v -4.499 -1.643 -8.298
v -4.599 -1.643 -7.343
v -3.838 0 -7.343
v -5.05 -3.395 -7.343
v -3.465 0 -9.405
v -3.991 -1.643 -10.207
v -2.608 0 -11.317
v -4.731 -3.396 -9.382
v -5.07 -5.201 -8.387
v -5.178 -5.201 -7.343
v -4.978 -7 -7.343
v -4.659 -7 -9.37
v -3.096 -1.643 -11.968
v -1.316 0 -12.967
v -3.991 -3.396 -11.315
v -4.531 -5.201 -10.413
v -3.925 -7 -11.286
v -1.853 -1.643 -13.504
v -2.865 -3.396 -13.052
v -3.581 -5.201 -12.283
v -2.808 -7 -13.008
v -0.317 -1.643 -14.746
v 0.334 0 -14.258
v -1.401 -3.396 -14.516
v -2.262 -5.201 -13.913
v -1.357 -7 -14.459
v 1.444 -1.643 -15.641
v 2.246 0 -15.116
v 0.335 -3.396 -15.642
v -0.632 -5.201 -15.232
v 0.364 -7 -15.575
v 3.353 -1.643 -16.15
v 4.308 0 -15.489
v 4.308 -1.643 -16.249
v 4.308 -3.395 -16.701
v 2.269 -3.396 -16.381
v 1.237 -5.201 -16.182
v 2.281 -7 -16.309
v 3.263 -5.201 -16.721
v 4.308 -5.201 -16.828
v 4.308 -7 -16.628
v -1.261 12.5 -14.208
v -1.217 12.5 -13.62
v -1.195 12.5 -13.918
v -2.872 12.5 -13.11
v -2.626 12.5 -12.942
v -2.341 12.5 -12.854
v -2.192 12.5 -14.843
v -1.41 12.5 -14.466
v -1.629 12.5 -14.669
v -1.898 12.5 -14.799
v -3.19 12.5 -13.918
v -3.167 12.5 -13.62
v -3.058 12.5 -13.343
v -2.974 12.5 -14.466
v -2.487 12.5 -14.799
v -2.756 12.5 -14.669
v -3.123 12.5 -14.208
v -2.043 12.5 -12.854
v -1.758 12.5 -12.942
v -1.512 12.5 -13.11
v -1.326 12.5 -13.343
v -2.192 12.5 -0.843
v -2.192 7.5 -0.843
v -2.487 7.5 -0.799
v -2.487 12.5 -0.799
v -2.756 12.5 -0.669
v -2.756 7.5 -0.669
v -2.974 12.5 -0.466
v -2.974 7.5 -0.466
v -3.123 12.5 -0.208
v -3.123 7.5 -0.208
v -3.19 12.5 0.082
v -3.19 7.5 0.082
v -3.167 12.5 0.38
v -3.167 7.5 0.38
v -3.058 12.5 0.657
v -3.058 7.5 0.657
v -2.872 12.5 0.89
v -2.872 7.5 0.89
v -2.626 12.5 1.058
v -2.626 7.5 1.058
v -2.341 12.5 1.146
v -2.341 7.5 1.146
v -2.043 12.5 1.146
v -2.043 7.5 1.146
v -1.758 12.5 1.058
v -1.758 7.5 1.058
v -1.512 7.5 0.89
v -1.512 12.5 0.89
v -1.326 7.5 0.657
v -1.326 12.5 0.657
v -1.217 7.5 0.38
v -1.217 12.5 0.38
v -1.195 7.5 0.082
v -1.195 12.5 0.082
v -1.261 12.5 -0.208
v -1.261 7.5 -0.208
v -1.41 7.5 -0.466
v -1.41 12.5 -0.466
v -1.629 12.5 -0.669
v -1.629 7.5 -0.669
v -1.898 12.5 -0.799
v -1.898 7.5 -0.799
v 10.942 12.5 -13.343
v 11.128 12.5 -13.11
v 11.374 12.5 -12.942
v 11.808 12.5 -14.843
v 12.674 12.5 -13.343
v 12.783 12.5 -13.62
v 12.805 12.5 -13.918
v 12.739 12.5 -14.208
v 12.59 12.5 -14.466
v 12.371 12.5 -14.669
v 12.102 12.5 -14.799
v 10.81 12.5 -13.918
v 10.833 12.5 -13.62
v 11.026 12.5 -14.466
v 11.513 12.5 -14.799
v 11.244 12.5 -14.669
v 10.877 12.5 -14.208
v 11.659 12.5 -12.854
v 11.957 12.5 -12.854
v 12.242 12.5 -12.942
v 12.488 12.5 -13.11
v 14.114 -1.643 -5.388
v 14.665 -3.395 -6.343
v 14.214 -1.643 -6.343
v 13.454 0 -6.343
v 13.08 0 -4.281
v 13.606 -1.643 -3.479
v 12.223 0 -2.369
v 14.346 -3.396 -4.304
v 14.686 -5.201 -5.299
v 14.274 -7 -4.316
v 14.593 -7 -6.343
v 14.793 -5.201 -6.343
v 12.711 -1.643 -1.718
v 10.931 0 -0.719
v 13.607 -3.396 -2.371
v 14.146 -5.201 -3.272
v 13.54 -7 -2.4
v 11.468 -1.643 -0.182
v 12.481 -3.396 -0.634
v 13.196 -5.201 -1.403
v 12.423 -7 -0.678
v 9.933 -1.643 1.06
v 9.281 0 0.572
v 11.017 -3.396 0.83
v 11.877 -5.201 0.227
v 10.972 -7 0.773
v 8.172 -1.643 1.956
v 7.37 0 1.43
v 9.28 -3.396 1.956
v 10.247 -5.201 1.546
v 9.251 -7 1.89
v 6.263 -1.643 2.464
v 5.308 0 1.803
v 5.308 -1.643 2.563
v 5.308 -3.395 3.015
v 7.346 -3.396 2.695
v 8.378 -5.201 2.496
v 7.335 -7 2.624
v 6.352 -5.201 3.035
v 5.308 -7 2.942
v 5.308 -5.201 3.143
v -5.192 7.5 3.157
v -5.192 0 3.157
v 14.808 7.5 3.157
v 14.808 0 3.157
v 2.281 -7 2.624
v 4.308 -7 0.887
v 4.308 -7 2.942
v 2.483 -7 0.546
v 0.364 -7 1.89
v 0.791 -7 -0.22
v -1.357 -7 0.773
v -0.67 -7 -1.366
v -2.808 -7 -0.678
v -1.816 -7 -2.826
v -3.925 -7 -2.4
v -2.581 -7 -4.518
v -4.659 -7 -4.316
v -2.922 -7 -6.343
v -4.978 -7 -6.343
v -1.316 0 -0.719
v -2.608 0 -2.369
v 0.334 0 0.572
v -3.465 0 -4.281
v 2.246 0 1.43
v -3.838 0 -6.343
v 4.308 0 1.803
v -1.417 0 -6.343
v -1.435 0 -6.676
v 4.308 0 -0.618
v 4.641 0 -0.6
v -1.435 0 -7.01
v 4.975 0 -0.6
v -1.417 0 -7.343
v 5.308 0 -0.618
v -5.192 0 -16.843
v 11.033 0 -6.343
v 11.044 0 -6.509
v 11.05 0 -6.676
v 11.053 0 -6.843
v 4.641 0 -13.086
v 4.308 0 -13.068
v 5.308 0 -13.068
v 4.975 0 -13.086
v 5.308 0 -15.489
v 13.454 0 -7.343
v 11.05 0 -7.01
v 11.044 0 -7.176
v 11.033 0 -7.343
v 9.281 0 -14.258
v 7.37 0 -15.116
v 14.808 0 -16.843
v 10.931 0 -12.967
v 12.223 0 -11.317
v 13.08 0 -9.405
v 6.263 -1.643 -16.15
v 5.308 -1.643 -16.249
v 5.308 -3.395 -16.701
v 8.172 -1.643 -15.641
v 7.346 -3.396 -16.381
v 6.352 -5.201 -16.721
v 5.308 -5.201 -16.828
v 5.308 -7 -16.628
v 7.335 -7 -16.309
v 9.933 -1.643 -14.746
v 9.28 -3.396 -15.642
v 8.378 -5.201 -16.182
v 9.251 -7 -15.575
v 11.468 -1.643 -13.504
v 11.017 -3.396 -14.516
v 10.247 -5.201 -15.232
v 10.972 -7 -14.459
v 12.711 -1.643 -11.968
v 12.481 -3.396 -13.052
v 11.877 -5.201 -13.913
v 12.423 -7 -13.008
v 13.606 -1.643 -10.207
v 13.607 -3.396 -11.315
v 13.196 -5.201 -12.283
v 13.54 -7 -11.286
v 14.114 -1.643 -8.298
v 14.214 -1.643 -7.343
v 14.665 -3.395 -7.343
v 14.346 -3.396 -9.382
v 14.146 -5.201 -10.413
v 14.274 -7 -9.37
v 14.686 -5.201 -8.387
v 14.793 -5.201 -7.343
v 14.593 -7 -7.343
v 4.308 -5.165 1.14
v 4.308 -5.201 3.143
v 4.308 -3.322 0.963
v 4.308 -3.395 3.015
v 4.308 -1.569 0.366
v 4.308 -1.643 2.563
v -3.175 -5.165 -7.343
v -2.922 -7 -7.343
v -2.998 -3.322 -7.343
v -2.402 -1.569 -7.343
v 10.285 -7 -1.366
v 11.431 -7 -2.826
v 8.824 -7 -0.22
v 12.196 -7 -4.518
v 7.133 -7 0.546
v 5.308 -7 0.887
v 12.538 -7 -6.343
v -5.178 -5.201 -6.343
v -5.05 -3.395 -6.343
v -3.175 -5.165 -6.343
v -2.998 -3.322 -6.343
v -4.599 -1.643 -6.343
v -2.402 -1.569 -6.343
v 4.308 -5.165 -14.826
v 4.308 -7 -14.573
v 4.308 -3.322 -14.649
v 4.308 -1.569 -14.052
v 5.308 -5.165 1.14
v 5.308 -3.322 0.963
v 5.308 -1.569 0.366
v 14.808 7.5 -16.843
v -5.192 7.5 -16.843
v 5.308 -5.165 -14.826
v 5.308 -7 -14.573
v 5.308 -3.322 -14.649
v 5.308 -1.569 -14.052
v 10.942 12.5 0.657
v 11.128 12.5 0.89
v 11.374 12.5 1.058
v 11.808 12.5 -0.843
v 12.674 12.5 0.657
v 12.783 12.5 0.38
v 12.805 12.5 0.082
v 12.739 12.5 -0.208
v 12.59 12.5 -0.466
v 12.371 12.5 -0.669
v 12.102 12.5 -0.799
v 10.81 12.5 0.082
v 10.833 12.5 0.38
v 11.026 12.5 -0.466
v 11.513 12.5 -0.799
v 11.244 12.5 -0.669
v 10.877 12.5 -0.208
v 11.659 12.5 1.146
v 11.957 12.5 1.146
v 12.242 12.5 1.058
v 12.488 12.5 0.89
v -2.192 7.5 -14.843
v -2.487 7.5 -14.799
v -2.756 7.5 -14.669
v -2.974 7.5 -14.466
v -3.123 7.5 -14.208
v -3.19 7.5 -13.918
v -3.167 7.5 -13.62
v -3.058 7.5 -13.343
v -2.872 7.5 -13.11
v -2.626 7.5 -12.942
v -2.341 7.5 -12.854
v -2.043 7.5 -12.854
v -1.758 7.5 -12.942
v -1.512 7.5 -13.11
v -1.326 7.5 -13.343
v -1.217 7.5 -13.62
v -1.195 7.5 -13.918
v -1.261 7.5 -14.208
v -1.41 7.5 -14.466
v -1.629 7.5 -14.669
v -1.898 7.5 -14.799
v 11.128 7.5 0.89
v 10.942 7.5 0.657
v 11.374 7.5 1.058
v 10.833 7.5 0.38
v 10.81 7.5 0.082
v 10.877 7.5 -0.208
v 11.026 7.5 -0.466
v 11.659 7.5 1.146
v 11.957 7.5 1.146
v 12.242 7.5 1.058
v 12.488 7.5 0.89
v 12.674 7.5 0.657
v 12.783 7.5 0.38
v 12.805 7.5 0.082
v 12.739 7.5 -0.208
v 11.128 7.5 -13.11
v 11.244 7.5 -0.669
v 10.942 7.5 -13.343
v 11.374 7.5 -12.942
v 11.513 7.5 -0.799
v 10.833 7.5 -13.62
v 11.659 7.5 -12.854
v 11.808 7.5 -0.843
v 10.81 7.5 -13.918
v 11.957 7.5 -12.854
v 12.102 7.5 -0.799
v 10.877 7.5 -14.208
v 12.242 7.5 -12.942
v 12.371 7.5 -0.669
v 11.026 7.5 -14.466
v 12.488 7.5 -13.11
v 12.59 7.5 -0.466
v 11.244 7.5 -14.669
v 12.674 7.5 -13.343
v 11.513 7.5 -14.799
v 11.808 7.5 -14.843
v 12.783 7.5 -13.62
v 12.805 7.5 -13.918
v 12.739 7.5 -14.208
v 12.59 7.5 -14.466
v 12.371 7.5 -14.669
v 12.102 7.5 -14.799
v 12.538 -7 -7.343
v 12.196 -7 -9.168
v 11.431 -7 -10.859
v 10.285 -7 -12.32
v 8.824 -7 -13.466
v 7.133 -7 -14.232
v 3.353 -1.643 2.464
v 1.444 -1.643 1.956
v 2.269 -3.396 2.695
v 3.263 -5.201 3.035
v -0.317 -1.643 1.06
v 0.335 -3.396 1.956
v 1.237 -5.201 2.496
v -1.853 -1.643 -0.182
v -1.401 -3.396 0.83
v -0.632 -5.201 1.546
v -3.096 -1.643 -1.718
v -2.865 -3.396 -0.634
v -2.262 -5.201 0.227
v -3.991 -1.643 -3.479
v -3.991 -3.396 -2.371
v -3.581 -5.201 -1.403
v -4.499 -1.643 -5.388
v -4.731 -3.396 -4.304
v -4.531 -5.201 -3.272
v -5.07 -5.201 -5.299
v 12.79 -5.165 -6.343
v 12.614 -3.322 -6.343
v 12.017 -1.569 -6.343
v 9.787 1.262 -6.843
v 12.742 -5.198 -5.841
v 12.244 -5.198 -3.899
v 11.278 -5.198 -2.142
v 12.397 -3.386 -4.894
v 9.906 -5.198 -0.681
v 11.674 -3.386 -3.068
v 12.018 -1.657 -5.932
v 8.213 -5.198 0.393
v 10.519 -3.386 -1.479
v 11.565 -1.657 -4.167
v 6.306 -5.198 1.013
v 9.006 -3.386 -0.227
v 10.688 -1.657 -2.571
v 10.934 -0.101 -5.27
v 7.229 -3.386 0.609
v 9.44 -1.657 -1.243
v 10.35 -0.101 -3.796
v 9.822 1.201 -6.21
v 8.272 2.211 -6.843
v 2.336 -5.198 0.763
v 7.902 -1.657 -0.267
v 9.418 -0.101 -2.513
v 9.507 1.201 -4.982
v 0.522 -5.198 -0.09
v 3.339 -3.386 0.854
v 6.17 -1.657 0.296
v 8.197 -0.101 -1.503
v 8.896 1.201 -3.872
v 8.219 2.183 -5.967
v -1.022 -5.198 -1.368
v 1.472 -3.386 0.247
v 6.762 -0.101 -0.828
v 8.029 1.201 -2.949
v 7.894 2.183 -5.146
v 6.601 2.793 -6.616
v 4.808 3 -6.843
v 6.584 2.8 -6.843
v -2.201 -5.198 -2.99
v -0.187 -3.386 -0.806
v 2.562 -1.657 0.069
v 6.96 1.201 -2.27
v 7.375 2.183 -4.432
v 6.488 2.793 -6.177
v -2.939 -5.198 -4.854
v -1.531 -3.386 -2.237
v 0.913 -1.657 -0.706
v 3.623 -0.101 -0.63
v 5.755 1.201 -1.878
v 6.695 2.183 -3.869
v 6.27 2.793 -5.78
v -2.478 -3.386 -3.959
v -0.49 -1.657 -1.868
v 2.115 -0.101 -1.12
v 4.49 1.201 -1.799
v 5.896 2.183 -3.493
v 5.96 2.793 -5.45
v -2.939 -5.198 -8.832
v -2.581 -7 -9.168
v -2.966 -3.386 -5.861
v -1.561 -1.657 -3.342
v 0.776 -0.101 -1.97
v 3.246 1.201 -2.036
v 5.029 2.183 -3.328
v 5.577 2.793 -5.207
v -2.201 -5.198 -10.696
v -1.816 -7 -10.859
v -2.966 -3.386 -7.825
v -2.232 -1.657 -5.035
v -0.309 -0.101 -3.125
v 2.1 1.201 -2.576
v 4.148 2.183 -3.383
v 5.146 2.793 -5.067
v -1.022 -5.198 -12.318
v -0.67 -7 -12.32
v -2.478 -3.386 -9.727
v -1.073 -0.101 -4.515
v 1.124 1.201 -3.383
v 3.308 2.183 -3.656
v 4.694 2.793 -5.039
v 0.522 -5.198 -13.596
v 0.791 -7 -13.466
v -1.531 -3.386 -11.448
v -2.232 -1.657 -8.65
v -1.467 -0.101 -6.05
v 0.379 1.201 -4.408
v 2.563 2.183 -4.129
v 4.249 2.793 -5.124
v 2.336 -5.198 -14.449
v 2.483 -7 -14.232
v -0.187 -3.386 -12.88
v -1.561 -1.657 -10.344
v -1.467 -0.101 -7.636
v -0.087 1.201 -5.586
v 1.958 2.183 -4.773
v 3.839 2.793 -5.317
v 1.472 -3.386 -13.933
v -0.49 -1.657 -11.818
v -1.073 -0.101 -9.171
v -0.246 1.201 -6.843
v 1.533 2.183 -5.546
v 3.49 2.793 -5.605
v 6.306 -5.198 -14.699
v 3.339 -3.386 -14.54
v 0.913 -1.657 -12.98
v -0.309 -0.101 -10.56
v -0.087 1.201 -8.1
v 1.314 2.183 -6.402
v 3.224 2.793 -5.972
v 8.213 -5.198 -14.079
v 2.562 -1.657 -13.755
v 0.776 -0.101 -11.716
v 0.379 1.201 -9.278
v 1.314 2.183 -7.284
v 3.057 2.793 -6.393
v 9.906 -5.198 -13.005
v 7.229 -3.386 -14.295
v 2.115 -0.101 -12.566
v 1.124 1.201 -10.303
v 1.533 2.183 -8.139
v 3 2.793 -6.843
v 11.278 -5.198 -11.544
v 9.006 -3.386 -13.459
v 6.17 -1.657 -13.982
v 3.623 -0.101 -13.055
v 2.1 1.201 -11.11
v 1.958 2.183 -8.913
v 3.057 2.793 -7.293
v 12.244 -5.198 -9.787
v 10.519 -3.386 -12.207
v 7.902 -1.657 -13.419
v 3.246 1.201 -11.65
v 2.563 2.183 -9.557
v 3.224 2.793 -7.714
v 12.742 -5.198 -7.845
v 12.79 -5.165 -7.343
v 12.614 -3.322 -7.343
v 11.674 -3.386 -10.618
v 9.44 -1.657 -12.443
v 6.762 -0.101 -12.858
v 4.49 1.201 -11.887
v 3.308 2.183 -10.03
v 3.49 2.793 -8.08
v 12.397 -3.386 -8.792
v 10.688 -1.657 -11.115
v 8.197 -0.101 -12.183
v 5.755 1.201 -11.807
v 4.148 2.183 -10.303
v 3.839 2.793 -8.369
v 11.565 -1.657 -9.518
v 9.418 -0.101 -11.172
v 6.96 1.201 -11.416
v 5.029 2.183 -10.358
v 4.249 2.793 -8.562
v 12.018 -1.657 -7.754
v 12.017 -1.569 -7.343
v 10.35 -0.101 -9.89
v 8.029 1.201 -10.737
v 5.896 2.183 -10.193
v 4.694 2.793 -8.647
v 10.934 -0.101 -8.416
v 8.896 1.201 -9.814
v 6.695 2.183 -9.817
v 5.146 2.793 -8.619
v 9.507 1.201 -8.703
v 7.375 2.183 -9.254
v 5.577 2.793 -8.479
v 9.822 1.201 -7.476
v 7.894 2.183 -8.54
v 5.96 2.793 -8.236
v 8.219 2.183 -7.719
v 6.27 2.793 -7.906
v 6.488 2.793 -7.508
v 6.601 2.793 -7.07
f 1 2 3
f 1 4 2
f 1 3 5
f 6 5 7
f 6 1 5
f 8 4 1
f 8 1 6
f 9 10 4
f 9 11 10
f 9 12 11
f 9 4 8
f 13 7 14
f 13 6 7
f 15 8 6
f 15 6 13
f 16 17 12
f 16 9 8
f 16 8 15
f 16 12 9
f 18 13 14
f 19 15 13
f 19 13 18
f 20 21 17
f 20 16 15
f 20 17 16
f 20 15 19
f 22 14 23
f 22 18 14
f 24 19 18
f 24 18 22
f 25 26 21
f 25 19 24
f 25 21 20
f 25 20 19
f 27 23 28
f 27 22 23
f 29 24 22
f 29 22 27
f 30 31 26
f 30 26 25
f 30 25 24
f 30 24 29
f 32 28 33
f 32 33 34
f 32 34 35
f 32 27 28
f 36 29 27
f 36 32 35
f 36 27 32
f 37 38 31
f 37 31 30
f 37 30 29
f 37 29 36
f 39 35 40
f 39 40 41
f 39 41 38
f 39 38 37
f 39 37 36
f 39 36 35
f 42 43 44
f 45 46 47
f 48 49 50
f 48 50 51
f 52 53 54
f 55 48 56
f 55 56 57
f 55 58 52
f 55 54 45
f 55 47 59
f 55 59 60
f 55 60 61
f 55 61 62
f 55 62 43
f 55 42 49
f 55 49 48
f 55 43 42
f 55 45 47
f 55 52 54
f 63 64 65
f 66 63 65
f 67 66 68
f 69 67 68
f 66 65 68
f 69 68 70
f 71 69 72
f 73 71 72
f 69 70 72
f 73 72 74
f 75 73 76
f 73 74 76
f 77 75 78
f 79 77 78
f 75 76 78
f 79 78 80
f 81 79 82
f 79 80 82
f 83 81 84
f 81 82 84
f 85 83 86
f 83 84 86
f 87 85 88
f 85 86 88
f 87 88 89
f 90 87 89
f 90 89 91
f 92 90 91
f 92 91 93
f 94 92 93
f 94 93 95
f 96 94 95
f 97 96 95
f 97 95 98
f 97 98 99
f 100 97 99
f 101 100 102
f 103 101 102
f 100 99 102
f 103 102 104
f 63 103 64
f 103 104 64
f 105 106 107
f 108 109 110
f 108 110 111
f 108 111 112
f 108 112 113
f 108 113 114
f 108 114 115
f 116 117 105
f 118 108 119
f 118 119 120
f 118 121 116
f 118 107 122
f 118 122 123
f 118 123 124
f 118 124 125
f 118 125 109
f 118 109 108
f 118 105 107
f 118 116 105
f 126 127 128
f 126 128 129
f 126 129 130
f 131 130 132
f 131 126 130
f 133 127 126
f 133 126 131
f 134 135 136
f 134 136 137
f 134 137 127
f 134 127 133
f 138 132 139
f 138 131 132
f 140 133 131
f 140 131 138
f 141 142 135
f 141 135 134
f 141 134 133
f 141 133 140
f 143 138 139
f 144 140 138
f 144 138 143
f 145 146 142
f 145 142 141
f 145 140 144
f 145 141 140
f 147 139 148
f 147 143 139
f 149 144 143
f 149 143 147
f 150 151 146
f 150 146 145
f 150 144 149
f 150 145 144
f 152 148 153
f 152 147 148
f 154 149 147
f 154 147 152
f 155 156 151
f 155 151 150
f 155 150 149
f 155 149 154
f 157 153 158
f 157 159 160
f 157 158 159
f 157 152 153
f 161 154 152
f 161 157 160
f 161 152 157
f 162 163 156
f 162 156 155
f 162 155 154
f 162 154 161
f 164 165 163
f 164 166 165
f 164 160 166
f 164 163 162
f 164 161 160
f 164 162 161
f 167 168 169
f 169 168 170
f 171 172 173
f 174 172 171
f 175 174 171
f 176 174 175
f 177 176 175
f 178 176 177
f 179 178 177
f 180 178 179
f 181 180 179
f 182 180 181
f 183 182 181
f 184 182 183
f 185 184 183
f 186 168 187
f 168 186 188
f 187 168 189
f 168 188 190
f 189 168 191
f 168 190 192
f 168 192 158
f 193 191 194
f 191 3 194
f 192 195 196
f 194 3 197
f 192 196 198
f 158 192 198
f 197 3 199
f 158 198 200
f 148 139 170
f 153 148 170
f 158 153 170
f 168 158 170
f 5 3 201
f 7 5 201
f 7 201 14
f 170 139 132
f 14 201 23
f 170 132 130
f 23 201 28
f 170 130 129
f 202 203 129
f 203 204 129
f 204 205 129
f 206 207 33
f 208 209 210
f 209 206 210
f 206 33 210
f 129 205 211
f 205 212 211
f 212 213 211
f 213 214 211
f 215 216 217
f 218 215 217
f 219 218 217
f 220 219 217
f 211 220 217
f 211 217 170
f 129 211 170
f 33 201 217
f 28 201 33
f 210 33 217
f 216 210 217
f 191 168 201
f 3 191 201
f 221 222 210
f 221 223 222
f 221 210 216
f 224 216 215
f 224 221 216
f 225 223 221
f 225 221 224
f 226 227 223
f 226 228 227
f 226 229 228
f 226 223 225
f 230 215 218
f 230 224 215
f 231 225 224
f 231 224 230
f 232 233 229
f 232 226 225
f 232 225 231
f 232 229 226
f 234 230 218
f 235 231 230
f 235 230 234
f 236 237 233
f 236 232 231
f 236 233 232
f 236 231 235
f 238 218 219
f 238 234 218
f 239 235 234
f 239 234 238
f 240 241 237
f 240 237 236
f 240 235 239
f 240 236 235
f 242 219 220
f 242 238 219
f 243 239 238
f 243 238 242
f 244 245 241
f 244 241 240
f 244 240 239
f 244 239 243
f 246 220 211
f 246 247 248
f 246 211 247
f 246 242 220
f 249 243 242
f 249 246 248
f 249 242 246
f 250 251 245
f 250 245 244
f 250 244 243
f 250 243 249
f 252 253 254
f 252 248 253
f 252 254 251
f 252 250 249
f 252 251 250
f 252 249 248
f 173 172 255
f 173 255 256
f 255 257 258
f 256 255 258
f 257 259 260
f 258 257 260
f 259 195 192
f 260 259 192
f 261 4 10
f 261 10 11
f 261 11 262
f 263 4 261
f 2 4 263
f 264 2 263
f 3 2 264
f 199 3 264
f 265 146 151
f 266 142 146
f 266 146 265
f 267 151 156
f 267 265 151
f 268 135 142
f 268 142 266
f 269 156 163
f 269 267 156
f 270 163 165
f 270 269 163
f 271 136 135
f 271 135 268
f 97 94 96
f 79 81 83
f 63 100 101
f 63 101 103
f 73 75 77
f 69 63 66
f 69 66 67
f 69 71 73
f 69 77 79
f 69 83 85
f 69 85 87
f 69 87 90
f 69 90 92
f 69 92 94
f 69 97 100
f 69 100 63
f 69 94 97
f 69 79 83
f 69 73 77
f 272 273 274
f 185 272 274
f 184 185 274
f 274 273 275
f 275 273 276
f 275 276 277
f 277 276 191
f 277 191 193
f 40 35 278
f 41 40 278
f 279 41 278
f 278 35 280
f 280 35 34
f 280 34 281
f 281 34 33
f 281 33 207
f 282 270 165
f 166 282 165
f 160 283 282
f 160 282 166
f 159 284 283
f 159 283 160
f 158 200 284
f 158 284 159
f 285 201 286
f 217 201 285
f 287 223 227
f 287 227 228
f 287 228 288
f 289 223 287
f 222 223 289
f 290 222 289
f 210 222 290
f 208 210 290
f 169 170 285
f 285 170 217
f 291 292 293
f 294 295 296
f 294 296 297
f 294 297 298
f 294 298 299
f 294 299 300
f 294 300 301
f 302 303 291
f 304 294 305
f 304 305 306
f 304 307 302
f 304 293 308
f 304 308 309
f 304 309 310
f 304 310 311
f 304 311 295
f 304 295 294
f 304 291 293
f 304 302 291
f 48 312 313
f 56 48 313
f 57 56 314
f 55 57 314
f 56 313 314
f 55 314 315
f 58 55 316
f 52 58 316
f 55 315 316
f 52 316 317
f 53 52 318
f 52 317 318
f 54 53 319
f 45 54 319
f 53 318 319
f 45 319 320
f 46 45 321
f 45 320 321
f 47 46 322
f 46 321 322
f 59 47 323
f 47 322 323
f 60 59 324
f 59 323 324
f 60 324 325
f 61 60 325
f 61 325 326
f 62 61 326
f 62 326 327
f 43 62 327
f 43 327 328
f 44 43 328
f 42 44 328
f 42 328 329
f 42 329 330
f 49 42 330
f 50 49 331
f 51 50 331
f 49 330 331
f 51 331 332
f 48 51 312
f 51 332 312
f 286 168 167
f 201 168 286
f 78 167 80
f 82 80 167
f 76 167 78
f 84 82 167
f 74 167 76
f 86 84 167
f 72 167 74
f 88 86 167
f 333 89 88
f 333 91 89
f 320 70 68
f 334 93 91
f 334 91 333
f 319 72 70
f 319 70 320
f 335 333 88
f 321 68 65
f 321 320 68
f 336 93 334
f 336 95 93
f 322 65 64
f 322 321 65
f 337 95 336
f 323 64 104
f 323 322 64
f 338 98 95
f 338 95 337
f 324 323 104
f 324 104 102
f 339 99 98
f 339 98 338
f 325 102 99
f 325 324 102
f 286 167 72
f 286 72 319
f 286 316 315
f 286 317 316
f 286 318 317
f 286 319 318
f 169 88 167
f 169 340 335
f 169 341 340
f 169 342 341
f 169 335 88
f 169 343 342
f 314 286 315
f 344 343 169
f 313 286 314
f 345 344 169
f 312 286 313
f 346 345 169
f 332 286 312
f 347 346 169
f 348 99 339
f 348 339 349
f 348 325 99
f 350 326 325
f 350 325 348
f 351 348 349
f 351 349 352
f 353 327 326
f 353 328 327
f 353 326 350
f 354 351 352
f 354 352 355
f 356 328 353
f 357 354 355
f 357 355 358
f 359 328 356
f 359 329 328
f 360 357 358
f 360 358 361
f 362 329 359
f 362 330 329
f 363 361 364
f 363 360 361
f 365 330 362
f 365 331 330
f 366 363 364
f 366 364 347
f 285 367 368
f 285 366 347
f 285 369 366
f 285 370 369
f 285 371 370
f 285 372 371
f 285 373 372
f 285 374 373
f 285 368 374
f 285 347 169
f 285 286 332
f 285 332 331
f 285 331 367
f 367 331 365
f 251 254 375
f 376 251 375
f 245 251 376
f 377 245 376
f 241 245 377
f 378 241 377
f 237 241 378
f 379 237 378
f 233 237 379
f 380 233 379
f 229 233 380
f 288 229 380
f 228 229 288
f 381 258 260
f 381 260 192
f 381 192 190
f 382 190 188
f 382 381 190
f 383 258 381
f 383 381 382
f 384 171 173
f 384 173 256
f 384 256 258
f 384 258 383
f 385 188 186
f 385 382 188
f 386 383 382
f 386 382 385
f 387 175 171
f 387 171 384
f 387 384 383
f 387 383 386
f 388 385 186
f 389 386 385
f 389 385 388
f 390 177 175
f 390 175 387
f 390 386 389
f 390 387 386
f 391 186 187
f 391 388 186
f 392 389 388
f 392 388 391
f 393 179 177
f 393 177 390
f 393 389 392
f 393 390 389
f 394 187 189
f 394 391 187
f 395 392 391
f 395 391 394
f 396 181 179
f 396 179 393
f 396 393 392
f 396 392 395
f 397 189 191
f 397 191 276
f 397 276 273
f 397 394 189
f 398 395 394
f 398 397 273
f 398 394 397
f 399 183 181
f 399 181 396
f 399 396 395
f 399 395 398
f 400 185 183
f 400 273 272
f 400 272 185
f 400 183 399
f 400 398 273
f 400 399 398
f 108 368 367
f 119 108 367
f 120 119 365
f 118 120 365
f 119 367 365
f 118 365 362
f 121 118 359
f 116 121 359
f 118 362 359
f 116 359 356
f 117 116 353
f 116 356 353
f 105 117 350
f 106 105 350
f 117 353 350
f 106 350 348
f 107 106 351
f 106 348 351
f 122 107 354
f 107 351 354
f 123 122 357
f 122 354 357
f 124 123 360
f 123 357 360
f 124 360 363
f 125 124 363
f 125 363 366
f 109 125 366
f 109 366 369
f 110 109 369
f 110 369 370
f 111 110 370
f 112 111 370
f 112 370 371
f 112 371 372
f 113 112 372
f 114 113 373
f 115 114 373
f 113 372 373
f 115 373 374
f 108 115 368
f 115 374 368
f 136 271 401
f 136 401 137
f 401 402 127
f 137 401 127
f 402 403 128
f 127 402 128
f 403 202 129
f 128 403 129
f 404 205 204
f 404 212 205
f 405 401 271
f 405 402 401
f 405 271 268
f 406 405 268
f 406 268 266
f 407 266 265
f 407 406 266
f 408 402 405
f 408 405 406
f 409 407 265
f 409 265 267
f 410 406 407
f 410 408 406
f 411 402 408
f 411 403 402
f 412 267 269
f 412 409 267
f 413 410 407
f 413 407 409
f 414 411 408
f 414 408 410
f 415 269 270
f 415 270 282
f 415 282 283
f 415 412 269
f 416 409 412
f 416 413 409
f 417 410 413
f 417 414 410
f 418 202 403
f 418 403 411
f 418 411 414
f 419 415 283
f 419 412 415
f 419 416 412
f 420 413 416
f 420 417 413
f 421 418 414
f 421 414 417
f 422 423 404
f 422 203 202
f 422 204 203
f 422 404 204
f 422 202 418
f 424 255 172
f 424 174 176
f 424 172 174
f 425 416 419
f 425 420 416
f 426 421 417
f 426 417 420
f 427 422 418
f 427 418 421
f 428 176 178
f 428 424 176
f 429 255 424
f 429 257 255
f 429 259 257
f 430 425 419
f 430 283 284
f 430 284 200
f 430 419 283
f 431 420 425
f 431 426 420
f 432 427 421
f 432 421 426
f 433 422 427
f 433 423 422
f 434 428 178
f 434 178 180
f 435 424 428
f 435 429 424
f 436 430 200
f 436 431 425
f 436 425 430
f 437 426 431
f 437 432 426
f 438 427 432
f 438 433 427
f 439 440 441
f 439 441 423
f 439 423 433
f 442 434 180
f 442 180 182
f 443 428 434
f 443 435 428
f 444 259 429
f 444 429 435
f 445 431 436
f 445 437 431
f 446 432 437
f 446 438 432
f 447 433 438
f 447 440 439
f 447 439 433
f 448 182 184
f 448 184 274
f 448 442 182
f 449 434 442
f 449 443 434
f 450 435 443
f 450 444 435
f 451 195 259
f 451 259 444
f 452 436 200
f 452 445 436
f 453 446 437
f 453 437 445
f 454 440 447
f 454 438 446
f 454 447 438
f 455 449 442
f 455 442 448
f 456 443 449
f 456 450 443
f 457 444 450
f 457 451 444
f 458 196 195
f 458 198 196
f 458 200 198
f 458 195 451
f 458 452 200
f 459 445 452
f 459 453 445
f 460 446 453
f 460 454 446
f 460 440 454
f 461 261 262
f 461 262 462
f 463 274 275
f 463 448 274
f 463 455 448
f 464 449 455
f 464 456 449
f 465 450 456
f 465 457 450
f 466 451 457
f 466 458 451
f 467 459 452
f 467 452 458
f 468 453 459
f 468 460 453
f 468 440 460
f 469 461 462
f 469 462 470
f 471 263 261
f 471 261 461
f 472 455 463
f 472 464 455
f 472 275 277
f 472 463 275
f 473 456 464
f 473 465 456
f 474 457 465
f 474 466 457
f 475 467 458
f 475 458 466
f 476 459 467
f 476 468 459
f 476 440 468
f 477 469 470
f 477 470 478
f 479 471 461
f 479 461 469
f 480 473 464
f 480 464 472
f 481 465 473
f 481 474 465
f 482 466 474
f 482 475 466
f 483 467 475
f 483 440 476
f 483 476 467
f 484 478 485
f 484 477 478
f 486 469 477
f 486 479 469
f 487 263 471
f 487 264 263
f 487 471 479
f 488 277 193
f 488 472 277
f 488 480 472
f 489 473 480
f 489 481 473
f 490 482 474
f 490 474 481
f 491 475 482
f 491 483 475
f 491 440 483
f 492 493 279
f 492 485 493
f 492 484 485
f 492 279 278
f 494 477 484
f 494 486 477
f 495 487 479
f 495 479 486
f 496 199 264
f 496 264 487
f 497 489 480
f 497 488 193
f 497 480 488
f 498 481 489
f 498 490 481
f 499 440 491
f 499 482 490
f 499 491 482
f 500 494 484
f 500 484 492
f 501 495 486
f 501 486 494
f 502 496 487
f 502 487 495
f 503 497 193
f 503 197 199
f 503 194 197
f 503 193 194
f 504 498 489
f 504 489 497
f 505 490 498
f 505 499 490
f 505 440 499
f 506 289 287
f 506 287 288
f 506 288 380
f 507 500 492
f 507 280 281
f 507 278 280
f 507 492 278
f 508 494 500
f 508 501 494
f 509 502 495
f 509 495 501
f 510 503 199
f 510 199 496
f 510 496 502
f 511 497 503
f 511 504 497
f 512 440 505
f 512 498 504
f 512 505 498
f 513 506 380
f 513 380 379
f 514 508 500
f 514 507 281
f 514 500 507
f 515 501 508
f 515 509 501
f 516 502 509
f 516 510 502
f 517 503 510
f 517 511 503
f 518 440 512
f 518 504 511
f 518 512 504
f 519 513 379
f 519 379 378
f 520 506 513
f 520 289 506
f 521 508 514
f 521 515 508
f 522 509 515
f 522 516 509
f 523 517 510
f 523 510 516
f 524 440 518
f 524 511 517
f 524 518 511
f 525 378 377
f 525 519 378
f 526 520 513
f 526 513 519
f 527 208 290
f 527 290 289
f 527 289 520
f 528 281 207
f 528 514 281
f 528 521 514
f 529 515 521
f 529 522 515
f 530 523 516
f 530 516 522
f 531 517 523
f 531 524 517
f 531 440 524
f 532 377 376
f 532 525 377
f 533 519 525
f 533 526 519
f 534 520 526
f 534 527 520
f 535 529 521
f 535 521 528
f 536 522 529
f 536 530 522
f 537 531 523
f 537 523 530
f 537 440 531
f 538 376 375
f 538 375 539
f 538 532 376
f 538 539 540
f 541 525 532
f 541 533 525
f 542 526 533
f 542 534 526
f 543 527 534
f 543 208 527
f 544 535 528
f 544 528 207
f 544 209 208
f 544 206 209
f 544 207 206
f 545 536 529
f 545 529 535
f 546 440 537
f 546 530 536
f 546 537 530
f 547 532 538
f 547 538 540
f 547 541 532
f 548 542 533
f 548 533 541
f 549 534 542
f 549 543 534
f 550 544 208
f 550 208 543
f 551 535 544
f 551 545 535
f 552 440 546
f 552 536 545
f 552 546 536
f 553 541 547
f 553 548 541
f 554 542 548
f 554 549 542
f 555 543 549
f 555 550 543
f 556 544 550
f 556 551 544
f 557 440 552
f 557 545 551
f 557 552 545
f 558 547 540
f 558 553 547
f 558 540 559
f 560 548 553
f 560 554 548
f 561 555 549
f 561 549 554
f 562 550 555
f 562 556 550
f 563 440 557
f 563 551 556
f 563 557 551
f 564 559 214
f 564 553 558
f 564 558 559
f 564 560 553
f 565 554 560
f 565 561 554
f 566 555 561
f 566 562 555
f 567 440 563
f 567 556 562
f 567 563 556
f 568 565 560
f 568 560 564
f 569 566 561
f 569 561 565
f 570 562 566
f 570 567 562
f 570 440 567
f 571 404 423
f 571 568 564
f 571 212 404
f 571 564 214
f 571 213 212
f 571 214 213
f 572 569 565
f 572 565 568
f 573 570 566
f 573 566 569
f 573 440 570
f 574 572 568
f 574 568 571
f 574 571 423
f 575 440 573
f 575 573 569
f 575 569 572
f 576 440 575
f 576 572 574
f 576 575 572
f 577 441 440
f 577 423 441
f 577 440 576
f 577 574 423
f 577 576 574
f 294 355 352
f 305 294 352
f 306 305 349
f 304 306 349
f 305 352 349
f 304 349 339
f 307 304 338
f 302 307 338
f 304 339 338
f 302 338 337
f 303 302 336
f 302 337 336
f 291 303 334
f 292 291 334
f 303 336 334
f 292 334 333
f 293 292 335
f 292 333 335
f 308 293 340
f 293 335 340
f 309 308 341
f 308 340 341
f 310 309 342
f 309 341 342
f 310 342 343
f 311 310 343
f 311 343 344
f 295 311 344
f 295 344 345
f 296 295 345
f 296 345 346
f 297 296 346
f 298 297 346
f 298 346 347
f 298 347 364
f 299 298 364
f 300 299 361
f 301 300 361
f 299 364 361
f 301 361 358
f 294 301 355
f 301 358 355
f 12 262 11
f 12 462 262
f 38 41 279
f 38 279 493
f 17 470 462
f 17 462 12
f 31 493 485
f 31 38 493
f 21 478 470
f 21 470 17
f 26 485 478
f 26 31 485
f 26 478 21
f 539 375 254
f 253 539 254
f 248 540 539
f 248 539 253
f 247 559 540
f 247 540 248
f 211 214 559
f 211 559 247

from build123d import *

# Parameters (mm, degrees)
SKETCH1_W               = 20
SKETCH1_H               = 20
BOSS_EXTRUDE1_DEPTH     = 7.5
SKETCH6_W               = 20
SKETCH6_H               = 20
CUT_EXTRUDE1_DEPTH      = 8
SKETCH8_R               = 1
BOSS_EXTRUDE3_DEPTH     = 5
CUT_EXTRUDE2_DEPTH      = 0.5
CUT_EXTRUDE2_DEPTH_BACK = 0.5
SKETCH9_W               = 20
SKETCH9_H               = 7
CUT_EXTRUDE3_DEPTH      = 0.5
CUT_EXTRUDE3_DEPTH_BACK = 0.5
SKETCH10_W              = 20
SKETCH10_H              = 7


with BuildPart() as part:
    # Sketch1 → Boss-Extrude1 (new body)
    with BuildSketch(Plane(origin=(0, 0, 0), x_dir=(1, 0, 0), z_dir=(0, 1, 0))):
        with Locations((4.807692308, 6.842948718)):
            Rectangle(SKETCH1_W, SKETCH1_H)
    extrude(amount=BOSS_EXTRUDE1_DEPTH)

    # Sketch3 → Cut-Revolve3 (revolve, cut)
    with BuildSketch(Plane.XY.offset(-6.842948718)):
        with BuildLine():
            ThreePointArc((4.807692308, -13), (12.807692308, -5), (4.807692308, 3))
            Line((4.807692308, 3), (4.807692308, -13))
        make_face()
    revolve(axis=Axis((4.807692308, 5, -6.842948718), (0, -1, 0)), mode=Mode.SUBTRACT)

    # Sketch5 → Revolve7 (revolve)
    with BuildSketch(Plane.XY.offset(-6.842948718)):
        with BuildLine():
            ThreePointArc((4.807692308, -13), (12.807692308, -5), (4.807692308, 3))
            Line((4.807692308, 3), (4.807692308, 5))
            ThreePointArc((4.807692308, 5), (14.807692308, -5), (4.807692308, -15))
            Line((4.807692308, -15), (4.807692308, -13))
        make_face()
    revolve(axis=Axis((4.807692308, 5, -6.842948718), (0, -1, 0)))

    # Sketch6 → Cut-Extrude1 (cut)
    with BuildSketch(Plane(origin=(0, -15, 0), x_dir=(-1, 0, 0), z_dir=(0, -1, 0))):
        with Locations((-4.807692308, 6.842948718)):
            Rectangle(SKETCH6_W, SKETCH6_H)
    extrude(amount=-CUT_EXTRUDE1_DEPTH, mode=Mode.SUBTRACT)

    # Sketch8 → Boss-Extrude3 (add)
    with BuildSketch(Plane(origin=(0, 7.5, 0), x_dir=(1, 0, 0), z_dir=(0, 1, 0))):
        with Locations(Location((-2.192307692, -0.157051282, 0), (0, 0, 90))):
            Circle(SKETCH8_R)
        with Locations(Location((-2.192307692, 13.842948718, 0), (0, 0, 90))):
            Circle(SKETCH8_R)
        with Locations(Location((11.807692308, -0.157051282, 0), (0, 0, 90))):
            Circle(SKETCH8_R)
        with Locations(Location((11.807692308, 13.842948718, 0), (0, 0, 90))):
            Circle(SKETCH8_R)
    extrude(amount=BOSS_EXTRUDE3_DEPTH)

    # Sketch9 → Cut-Extrude2 (cut, two sides: drawn at the far end of the back side and taken through both)
    with BuildSketch(Plane.XY.offset(-6.842948718).offset(-CUT_EXTRUDE2_DEPTH_BACK)):
        with Locations((4.807692308, -3.5)):
            Rectangle(SKETCH9_W, SKETCH9_H)
    extrude(amount=CUT_EXTRUDE2_DEPTH + CUT_EXTRUDE2_DEPTH_BACK, mode=Mode.SUBTRACT)


with BuildPart() as cut_extrude2_kept_piece:
    # of the separate pieces the step leaves, the one the design keeps (cut_extrude2_pieces_kept)
    add(part.part.solids().sort_by_distance((-5.192307692, 0, 3.157051282))[0])

    # Sketch10 → Cut-Extrude3 (cut, two sides: drawn at the far end of the back side and taken through both)
    with BuildSketch(Plane.ZY.offset(-4.807692308).offset(-CUT_EXTRUDE3_DEPTH_BACK)):
        with Locations((-6.842948718, -3.5)):
            Rectangle(SKETCH10_W, SKETCH10_H)
    extrude(amount=CUT_EXTRUDE3_DEPTH + CUT_EXTRUDE3_DEPTH_BACK, mode=Mode.SUBTRACT)


with BuildPart() as cut_extrude3_kept_piece:
    # of the separate pieces the step leaves, the one the design keeps (cut_extrude3_pieces_kept)
    add(cut_extrude2_kept_piece.part.solids().sort_by_distance((-5.192307692, 0, 3.157051282))[0])


solid = cut_extrude3_kept_piece.part
